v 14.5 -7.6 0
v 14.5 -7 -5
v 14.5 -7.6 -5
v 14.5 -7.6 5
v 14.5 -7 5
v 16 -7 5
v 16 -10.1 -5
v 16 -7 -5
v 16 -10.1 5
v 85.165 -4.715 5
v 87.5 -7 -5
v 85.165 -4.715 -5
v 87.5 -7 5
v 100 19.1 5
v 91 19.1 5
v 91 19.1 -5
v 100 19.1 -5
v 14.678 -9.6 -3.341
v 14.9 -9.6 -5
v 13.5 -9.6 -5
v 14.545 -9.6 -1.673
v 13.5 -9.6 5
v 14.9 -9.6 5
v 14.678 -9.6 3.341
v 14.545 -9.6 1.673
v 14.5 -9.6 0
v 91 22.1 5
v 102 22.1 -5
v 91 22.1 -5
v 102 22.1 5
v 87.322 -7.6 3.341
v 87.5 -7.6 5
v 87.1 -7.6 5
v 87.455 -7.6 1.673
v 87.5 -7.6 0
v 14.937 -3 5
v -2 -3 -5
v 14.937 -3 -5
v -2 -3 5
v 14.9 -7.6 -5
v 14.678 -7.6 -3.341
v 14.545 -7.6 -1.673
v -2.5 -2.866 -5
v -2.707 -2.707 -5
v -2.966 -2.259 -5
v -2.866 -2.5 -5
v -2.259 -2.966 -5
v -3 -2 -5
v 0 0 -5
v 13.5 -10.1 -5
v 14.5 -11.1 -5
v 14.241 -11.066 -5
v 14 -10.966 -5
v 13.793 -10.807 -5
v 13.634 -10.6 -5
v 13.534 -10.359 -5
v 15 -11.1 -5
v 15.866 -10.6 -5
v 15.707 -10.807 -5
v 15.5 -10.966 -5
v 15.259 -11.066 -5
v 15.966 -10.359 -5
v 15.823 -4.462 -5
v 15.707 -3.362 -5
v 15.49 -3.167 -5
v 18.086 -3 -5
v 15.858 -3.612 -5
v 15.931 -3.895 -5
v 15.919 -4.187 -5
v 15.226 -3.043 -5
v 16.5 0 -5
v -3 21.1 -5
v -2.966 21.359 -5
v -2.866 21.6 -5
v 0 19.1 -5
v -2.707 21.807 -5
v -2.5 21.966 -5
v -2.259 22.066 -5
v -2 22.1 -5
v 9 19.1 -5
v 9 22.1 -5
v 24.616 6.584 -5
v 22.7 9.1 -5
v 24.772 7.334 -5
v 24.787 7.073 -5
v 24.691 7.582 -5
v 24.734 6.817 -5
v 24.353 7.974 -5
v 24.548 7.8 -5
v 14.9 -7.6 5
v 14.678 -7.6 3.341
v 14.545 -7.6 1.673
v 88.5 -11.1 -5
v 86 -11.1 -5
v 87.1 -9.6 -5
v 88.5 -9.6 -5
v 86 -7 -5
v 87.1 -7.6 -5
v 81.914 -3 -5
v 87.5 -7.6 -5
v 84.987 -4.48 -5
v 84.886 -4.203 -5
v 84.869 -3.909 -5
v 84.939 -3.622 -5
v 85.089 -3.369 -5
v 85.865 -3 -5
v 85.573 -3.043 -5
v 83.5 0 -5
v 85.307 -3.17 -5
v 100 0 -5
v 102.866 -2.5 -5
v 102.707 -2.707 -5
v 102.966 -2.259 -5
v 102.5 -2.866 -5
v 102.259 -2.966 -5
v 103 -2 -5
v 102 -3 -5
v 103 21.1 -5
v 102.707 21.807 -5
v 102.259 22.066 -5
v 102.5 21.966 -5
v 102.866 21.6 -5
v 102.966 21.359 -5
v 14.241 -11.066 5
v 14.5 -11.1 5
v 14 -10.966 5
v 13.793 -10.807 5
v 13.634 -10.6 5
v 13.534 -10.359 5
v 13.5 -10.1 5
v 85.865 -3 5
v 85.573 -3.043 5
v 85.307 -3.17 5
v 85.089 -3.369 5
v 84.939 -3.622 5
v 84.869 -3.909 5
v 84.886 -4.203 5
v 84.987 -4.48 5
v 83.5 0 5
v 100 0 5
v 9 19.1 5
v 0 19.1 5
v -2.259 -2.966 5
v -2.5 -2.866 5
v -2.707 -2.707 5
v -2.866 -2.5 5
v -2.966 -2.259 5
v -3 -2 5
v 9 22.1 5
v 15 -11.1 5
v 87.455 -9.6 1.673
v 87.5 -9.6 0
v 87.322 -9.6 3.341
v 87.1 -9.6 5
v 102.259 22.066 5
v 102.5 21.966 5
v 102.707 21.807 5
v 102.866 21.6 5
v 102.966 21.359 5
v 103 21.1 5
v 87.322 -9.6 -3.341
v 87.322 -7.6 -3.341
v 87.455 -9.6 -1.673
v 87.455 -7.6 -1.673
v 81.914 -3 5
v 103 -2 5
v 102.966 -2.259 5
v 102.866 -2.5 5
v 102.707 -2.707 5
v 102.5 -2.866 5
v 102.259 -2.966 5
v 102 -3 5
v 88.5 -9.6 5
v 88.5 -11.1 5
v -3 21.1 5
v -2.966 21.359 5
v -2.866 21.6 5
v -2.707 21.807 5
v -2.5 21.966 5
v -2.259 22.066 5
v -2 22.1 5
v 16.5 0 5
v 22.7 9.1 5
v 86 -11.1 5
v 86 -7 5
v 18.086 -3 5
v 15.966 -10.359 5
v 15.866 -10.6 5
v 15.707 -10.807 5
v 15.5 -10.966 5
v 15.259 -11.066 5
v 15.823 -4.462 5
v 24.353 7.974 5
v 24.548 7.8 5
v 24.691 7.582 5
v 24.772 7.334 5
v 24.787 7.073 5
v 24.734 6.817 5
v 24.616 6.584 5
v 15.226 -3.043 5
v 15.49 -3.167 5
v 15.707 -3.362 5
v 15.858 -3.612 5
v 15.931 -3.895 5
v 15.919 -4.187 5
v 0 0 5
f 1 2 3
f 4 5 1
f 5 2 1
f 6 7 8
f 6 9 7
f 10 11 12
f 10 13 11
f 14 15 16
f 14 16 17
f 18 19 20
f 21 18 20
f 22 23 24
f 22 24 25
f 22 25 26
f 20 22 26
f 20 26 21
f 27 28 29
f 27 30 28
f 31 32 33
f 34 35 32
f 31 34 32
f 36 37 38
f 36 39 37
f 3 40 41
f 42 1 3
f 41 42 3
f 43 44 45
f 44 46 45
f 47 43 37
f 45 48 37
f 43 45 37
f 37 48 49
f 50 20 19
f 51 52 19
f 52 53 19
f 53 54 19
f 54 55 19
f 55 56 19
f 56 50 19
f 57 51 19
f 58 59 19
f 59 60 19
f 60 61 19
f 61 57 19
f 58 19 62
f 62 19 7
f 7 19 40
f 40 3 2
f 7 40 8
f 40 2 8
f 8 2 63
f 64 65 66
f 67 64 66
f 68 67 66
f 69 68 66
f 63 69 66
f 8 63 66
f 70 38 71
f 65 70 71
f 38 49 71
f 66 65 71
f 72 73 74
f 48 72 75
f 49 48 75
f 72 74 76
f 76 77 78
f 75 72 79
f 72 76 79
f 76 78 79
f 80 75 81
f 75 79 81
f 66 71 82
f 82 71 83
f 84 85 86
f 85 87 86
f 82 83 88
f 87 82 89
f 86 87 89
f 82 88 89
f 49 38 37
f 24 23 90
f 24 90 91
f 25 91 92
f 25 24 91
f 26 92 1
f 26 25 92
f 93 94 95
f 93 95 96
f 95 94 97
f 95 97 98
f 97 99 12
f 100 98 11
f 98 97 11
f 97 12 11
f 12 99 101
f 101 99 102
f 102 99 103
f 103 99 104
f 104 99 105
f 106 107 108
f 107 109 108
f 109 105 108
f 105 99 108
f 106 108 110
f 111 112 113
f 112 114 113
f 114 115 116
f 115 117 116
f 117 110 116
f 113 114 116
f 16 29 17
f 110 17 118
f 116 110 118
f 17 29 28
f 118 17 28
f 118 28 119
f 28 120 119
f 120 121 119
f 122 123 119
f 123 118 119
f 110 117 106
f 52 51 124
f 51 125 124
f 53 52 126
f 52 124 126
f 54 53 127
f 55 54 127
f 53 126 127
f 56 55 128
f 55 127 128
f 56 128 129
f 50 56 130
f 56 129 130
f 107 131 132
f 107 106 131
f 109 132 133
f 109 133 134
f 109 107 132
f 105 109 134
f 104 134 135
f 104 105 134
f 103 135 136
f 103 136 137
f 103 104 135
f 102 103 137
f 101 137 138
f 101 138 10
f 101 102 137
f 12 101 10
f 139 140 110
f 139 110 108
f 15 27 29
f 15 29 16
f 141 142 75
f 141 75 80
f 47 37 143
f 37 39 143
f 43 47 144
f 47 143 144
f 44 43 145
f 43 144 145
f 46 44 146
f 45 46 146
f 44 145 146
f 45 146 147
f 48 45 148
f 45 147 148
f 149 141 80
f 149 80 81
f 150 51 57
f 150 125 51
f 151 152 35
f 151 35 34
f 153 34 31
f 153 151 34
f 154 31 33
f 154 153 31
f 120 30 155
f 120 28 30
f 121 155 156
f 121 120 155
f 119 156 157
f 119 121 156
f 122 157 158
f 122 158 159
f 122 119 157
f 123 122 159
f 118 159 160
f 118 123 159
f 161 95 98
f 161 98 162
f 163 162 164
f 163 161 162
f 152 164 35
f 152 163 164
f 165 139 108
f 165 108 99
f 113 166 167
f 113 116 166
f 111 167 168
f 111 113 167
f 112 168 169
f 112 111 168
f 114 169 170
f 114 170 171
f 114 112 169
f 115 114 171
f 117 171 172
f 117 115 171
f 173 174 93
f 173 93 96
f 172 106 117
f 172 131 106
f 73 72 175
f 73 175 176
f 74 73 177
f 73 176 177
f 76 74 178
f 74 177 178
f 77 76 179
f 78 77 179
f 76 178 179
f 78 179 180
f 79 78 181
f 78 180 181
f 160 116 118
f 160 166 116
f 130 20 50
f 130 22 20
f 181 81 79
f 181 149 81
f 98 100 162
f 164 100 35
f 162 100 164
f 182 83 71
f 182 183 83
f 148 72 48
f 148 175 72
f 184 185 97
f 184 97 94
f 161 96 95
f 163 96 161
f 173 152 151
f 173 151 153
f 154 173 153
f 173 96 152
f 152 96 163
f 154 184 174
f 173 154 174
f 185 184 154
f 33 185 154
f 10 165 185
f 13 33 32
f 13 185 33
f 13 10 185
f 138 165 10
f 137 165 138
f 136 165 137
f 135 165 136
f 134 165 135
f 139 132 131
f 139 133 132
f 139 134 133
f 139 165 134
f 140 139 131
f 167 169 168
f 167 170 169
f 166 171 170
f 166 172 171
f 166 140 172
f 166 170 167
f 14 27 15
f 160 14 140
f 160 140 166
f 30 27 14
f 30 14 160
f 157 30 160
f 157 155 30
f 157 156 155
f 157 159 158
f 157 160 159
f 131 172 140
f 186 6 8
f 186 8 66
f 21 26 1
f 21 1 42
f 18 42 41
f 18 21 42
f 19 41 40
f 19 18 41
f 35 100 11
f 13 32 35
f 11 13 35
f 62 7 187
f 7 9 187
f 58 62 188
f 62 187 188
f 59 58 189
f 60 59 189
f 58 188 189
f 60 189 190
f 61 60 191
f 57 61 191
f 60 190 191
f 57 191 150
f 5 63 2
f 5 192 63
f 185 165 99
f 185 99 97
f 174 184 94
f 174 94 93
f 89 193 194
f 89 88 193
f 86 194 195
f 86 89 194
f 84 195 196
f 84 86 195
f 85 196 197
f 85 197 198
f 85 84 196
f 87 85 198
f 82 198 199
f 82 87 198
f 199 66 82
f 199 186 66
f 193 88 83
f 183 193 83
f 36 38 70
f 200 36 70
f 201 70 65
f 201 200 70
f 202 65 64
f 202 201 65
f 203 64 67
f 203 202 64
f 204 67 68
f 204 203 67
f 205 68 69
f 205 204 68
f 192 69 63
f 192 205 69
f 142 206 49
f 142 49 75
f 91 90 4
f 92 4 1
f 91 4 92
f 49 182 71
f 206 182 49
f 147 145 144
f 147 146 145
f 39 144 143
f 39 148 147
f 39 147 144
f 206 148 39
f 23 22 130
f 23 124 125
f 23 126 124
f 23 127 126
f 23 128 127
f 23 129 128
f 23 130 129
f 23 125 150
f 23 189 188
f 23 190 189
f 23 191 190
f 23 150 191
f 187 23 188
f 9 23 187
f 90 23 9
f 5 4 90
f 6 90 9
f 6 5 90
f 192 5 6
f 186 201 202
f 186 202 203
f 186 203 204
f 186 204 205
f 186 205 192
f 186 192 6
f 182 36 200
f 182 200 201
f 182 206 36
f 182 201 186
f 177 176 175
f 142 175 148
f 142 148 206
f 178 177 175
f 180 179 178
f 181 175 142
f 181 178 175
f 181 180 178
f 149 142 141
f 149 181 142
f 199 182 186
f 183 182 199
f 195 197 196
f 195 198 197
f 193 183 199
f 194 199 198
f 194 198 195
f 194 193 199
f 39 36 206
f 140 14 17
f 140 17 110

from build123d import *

# Parameters (mm, degrees)
F1_DEPTH = 5
F3_R     = 1
F3_2_R   = 1
F4_R     = 1
F4_2_R   = 1
F6_DEPTH = 2
F8_DEPTH = 2


# Not quite as in the source:
# - a feature names something its author has since deleted; it is built from what else it names


with BuildPart() as f1:
    # F0 (on Top) → F1 (new body, symmetric)
    with BuildSketch(Plane.XY):
        Polygon((103, 22.1), (91, 22.1), (91, 19.1), (100, 19.1), (100, 0), (83.5, 0), (81.9138380969, -3), (83.4138380969, -3), (103, -3), align=None)
        Polygon((87.5, -7), (83.4138380969, -3), (81.9138380969, -3), (86, -7), (86, -11.1), (88.5, -11.1), (88.5, -9.6), (87.5, -9.6), align=None)
    extrude(amount=F1_DEPTH, both=True)

    # F3
    f3_edges = [f1.edges().sort_by_distance(p)[0] for p in [
        (103, 22.1, 0),
        (103, -3, 0),
    ]]
    fillet(f3_edges, radius=F3_R)

    # F4
    f4_edges = [f1.edges().sort_by_distance(p)[0] for p in [
        (83.413838, -3, 0),
    ]]
    fillet(f4_edges, radius=F4_R)

    # F7 (on face) → F8 (cut)
    with BuildSketch(Plane(origin=(0, -9.6, 0), x_dir=(-1, 0, 0), z_dir=(0, 1, 0))):
        with BuildLine():
            ThreePointArc((-87.5, 0), (-87.39984051, 2.5079872408), (-87.1, 5))
            Line((-87.1, 5), (-87.5, 5))
            Line((-87.5, 5), (-87.5, 0))
        make_face()
        with BuildLine():
            ThreePointArc((-87.1, -5), (-87.39984051, -2.5079872408), (-87.5, 0))
            Line((-87.5, 0), (-87.5, -5))
            Line((-87.5, -5), (-87.1, -5))
        make_face()
    extrude(amount=F8_DEPTH, mode=Mode.SUBTRACT)


with BuildPart() as f1b:
    # F0 (on Top) → F1, piece 2 (new body, symmetric)
    with BuildSketch(Plane.XY):
        Polygon((16.5, 0), (0, 0), (0, 19.1), (9, 19.1), (9, 22.1), (-3, 22.1), (-3, -3), (16.5861619031, -3), (18.0861619031, -3), (25.1792582862, 7.4108350138), (22.7, 9.1), align=None)
        Polygon((16, -7), (18.0861619031, -3), (16.5861619031, -3), (14.5, -7), (14.5, -9.6), (13.5, -9.6), (13.5, -11.1), (16, -11.1), align=None)
    extrude(amount=F1_DEPTH, both=True)

    # F3#2
    f3_2_edges = [f1b.edges().sort_by_distance(p)[0] for p in [
        (13.5, -11.1, 0),
        (16, -11.1, 0),
        (25.179258, 7.410835, 0),
        (-3, -3, 0),
        (-3, 22.1, 0),
    ]]
    fillet(f3_2_edges, radius=F3_2_R)

    # F4#2
    f4_2_edges = [f1b.edges().sort_by_distance(p)[0] for p in [
        (16.586162, -3, 0),
    ]]
    fillet(f4_2_edges, radius=F4_2_R)

    # F5 (on face) → F6 (cut)
    with BuildSketch(Plane(origin=(0, -9.6, 0), x_dir=(-1, 0, 0), z_dir=(0, 1, 0))):
        with BuildLine():
            ThreePointArc((-14.9, 5), (-14.60015949, 2.5079872408), (-14.5, 0))
            Line((-14.5, 0), (-14.5, 5))
            Line((-14.5, 5), (-14.9, 5))
        make_face()
        with BuildLine():
            ThreePointArc((-14.5, 0), (-14.60015949, -2.5079872408), (-14.9, -5))
            Line((-14.9, -5), (-14.5, -5))
            Line((-14.5, -5), (-14.5, 0))
        make_face()
    extrude(amount=F6_DEPTH, mode=Mode.SUBTRACT)


solid = Compound([f1.part, f1b.part])
